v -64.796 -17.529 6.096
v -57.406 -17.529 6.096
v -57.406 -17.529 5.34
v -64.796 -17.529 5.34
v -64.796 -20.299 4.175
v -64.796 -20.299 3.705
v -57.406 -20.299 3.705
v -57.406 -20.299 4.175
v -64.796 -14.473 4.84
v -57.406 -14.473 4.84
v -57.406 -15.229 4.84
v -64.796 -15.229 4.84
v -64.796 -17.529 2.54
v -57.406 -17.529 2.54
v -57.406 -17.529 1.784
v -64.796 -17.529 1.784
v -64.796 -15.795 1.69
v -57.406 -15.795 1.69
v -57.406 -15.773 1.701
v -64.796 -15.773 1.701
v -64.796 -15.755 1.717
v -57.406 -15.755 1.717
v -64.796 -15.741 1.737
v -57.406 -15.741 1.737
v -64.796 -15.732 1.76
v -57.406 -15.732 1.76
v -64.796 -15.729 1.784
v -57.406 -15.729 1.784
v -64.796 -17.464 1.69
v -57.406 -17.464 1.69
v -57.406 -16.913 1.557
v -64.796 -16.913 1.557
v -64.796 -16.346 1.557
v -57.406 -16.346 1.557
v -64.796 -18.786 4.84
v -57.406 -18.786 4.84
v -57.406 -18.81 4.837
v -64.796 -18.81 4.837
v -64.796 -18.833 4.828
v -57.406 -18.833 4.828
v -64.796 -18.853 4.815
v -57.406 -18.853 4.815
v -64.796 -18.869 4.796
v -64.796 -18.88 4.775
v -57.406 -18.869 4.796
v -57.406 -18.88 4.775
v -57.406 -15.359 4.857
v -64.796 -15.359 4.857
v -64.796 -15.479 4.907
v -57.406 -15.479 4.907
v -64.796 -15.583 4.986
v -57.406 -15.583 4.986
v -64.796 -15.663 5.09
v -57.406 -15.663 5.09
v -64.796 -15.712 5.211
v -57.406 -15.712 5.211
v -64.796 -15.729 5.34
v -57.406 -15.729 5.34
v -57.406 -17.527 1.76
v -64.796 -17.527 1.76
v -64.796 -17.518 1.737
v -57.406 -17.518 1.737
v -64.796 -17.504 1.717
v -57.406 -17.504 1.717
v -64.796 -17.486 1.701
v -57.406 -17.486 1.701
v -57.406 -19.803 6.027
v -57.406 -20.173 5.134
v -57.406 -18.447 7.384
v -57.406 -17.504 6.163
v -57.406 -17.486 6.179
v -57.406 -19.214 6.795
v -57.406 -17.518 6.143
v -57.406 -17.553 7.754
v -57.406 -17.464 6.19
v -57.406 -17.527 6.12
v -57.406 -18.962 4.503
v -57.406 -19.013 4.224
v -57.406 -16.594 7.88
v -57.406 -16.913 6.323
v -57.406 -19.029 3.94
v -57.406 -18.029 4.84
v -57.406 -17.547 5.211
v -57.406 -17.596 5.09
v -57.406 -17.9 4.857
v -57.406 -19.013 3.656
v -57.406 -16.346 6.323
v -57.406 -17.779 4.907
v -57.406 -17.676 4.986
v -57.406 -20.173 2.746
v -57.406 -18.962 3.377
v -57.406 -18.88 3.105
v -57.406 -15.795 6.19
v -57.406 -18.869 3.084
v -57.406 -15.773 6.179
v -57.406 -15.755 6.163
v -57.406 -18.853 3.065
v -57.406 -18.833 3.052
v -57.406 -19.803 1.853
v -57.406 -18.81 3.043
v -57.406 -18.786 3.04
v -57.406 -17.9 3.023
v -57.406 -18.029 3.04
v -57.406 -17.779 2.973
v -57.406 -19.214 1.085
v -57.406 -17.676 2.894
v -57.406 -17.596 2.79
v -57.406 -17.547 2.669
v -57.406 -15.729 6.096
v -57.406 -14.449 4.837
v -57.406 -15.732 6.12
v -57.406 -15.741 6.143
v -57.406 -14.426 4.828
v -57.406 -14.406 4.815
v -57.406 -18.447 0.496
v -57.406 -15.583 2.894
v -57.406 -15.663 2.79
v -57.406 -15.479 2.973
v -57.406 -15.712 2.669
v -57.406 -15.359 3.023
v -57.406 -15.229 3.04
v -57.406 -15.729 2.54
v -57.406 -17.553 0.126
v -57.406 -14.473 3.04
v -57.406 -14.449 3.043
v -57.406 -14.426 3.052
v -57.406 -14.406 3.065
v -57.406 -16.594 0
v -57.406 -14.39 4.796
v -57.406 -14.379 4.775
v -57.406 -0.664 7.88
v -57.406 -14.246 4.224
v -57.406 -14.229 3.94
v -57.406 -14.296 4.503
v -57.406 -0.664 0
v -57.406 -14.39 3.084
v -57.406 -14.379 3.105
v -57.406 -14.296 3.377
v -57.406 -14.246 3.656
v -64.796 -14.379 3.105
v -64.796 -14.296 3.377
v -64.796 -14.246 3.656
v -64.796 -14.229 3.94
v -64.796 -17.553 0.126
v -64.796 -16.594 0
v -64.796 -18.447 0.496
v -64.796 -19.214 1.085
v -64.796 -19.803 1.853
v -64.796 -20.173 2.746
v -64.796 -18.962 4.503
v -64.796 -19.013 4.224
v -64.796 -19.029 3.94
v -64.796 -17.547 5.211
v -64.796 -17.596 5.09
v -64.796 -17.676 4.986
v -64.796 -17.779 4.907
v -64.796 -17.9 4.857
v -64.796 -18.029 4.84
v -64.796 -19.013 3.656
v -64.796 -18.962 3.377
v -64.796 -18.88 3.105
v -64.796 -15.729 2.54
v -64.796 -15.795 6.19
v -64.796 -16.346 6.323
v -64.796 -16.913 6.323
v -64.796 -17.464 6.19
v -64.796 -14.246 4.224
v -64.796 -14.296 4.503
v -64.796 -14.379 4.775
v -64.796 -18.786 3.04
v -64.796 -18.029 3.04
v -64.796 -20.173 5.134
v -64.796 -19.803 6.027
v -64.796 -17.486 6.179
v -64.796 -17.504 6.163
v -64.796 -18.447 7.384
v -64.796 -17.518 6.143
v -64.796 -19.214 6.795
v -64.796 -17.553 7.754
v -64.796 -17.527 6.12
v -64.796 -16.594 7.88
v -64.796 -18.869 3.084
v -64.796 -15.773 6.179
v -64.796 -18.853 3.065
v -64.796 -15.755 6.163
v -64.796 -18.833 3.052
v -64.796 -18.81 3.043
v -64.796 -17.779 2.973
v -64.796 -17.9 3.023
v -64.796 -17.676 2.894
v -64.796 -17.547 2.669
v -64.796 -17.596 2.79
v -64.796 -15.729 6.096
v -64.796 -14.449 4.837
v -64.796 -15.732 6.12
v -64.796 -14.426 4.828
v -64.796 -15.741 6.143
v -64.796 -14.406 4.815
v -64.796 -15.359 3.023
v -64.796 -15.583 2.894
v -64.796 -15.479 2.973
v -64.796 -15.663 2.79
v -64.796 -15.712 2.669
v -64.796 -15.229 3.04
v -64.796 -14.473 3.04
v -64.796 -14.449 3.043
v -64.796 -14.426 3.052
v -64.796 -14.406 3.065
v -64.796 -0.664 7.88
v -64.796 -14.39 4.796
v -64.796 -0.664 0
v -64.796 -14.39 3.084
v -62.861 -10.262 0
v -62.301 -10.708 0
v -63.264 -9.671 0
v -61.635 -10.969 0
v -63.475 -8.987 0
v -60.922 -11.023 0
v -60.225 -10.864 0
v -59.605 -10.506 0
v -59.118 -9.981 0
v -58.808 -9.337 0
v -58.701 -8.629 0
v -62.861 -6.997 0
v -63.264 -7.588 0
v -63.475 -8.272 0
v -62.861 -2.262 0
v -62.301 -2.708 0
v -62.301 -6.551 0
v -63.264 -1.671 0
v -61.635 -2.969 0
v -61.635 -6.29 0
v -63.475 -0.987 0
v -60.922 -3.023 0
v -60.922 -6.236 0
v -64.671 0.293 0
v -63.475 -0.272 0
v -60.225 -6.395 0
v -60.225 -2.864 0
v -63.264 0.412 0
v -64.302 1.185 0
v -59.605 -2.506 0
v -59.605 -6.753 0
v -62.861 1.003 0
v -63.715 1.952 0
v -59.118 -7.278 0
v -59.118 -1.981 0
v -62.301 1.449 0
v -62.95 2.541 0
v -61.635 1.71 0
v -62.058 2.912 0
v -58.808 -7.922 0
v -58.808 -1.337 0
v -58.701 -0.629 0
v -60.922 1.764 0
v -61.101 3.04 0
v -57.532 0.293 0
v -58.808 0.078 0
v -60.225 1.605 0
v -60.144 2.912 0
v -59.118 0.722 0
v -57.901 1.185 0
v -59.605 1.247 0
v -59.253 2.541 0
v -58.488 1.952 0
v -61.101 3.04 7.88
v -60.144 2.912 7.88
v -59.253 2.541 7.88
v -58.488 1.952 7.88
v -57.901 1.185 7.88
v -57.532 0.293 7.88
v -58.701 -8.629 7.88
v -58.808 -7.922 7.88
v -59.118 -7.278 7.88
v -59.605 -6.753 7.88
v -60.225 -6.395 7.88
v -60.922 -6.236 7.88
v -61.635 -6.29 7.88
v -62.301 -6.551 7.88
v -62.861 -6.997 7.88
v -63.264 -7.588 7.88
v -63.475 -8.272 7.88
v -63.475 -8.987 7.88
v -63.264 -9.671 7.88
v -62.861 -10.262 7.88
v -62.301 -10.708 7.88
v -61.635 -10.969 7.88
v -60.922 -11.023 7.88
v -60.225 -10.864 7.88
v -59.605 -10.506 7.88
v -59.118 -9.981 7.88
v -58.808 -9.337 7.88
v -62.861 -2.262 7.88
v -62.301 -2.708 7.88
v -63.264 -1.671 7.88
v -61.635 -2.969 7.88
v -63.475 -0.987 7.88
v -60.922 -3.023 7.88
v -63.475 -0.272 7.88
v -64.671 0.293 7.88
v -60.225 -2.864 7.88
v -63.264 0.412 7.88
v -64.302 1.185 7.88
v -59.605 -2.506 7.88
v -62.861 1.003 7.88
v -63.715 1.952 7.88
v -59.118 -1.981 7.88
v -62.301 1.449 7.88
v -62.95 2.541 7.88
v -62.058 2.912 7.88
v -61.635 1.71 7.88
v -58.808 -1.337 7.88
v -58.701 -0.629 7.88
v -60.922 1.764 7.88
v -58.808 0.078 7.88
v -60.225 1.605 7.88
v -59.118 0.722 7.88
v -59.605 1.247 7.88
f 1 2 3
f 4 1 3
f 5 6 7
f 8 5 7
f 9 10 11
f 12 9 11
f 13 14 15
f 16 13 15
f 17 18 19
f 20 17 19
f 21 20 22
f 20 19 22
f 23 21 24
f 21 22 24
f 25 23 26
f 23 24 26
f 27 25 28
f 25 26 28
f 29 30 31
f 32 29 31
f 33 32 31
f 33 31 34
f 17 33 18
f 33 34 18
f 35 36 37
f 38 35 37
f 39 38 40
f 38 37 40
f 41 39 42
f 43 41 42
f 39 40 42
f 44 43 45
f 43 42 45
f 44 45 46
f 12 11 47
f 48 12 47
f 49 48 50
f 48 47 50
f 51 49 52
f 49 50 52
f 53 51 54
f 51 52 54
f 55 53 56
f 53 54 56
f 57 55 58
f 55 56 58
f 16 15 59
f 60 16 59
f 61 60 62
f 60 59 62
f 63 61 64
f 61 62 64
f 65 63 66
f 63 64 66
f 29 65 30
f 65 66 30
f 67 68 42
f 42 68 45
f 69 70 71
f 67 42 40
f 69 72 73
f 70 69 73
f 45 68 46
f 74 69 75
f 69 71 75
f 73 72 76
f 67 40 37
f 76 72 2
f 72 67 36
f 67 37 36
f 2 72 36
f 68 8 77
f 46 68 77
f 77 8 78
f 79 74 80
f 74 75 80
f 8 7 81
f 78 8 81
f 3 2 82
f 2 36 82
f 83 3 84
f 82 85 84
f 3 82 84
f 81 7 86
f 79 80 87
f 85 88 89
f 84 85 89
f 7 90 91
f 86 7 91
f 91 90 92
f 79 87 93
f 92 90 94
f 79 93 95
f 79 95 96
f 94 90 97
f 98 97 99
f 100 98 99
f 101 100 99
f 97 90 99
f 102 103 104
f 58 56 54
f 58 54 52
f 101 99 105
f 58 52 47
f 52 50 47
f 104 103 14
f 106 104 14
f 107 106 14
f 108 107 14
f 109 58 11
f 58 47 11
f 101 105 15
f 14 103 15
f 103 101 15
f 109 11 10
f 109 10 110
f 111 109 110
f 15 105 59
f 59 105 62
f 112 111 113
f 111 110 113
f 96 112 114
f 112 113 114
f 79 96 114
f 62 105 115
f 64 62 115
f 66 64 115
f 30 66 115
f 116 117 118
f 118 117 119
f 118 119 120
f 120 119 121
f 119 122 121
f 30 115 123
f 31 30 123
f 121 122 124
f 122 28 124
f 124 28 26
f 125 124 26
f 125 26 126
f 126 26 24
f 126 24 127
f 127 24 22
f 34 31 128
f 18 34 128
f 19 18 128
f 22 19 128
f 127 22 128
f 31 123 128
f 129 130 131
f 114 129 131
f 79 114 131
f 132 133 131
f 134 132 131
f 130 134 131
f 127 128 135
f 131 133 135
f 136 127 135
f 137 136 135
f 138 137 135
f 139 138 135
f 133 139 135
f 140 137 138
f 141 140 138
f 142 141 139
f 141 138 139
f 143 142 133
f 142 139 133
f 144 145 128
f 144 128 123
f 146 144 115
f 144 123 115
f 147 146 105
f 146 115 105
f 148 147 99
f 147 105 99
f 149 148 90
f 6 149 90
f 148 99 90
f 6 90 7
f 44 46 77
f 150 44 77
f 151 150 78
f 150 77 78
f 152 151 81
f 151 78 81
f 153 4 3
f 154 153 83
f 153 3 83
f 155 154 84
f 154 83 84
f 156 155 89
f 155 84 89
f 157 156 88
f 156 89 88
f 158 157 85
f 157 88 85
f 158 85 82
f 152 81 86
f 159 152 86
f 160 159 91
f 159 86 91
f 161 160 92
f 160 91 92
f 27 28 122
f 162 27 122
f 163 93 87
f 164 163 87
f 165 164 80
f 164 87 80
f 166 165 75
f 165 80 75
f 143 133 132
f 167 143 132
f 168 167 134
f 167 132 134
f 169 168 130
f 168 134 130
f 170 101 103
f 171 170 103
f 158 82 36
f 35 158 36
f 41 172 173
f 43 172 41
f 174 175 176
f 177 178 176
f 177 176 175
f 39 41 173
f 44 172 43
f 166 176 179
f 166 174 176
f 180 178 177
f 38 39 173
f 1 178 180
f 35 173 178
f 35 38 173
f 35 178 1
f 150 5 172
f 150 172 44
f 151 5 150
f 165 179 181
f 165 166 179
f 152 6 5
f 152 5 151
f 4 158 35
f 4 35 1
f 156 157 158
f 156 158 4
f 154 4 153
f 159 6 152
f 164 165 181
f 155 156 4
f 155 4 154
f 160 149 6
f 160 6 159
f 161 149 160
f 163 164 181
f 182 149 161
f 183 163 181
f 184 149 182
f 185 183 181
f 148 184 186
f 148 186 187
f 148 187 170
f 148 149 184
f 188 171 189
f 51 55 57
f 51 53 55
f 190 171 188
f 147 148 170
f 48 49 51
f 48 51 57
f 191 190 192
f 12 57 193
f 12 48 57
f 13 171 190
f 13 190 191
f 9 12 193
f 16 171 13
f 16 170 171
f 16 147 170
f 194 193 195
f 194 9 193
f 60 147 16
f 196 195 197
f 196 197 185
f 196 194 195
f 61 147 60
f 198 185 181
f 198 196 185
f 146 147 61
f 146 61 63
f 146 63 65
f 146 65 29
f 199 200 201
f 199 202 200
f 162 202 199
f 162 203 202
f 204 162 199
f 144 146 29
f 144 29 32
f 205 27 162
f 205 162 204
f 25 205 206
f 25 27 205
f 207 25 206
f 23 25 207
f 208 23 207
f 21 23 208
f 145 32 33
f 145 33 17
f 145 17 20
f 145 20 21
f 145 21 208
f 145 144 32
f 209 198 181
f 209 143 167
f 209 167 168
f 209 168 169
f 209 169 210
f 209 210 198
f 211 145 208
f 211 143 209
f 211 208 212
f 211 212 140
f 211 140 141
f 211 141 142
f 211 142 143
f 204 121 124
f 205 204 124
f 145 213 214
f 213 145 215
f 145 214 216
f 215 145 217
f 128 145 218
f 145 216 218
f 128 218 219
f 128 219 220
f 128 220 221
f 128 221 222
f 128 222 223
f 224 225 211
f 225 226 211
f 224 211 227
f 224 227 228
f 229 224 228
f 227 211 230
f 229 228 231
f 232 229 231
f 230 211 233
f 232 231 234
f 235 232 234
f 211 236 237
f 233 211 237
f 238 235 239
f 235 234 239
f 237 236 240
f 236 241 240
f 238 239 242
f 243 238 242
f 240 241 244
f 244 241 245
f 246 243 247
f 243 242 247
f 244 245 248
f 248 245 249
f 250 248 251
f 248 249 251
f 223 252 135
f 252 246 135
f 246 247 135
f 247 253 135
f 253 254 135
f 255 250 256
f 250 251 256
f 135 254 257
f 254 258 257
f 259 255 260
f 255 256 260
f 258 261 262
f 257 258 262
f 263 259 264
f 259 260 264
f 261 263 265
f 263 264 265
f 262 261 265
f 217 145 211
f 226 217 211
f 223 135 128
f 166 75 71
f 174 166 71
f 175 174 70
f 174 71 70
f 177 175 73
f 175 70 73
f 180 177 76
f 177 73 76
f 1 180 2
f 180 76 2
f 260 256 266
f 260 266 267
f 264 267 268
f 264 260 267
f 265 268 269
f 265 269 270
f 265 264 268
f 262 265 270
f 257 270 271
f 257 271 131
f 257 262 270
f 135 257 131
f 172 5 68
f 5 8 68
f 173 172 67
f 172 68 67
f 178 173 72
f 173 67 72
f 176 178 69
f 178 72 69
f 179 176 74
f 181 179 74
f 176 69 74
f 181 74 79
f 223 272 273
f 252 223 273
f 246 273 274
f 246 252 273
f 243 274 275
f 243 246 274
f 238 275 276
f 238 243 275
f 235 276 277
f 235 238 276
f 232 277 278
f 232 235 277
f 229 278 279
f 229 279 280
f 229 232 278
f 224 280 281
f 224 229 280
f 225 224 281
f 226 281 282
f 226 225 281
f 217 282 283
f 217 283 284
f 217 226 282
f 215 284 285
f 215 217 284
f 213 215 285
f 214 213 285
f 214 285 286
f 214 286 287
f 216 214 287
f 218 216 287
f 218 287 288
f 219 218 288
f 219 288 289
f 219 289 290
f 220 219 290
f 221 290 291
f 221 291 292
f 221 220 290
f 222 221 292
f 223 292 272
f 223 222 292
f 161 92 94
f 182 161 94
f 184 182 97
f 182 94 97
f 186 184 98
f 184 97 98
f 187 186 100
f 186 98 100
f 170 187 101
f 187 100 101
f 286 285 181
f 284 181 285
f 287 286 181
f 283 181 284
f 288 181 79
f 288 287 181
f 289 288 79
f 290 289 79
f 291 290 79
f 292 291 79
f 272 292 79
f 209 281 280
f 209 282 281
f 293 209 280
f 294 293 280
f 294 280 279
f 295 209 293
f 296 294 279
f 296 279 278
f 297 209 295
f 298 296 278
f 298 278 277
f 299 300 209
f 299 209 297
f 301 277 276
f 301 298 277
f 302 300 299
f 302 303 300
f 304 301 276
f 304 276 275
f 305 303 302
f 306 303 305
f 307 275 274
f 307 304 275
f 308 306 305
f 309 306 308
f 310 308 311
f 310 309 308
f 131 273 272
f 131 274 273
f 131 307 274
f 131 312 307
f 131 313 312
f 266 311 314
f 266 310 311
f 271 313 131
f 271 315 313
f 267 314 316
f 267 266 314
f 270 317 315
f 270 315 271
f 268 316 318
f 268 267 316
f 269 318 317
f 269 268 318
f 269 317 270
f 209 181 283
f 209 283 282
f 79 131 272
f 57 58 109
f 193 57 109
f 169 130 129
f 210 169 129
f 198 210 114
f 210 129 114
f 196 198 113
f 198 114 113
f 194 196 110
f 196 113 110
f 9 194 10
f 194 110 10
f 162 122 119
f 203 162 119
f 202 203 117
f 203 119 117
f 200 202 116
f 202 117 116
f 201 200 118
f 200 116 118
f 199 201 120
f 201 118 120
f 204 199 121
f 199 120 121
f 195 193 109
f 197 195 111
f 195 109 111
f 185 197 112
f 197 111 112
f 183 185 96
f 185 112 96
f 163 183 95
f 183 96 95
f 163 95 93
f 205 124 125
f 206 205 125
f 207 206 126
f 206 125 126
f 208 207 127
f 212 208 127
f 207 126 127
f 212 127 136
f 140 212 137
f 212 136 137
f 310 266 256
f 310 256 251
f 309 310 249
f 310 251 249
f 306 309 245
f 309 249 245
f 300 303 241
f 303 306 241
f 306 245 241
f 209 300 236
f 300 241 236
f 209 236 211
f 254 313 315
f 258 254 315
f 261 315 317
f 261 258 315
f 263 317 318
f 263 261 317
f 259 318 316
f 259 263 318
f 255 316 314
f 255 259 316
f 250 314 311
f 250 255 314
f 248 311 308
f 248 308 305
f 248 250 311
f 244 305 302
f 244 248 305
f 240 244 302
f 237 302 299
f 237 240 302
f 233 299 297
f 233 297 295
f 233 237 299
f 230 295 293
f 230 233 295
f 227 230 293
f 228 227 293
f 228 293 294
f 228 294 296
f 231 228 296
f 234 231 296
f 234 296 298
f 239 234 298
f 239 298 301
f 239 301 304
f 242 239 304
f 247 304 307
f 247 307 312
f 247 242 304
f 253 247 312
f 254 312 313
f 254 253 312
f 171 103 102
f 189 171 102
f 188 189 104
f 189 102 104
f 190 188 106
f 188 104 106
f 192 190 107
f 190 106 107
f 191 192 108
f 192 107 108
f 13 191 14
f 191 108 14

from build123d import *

# Parameters (mm, degrees)
F0_W        = 7.39
F0_H        = 23.34
F0_R        = 2.4
F1_DEPTH    = 7.88
F2_T1_DEPTH = 26.405
F4_DEPTH    = 7.391
F5_R        = 3.705


# Not quite as in the source:
# - a fillet or chamfer that OpenCascade refuses, or shapes differently, is made with other operations: its cross-section is extruded or revolved along the edge and cut away or added


with BuildPart() as f1:
    # F0 (on Top) → F1 (new body)
    with BuildSketch(Plane.XY):
        with Locations((-61.1013304442, -8.6294944299)):
            Rectangle(F0_W, F0_H)
        with Locations((-61.1013304442, -8.6294944299)):
            Circle(F0_R, mode=Mode.SUBTRACT)
        with Locations((-61.1013304442, -0.6294944299)):
            Circle(F0_R, mode=Mode.SUBTRACT)
    extrude(amount=F1_DEPTH)

    # F2: fillet of radius 3.705 on 2 edges, made by hand

    # F2_s2 → F2_t1 (cut)
    with BuildSketch(Plane.XY.offset(-9.2625)):
        with BuildLine():
            ThreePointArc((-61.0913304442, 3.0405055701), (-63.7111610685, 1.9553361944), (-64.7963304442, -0.6644944299))
            Line((-64.7963304442, -0.6644944299), (-64.7963304442, 3.0405055701))
            Line((-64.7963304442, 3.0405055701), (-61.0913304442, 3.0405055701))
        make_face()
        with BuildLine():
            ThreePointArc((-61.1113304442, 3.0405055701), (-58.4914998199, 1.9553361944), (-57.4063304442, -0.6644944299))
            Line((-57.4063304442, -0.6644944299), (-57.4063304442, 3.0405055701))
            Line((-57.4063304442, 3.0405055701), (-61.1113304442, 3.0405055701))
        make_face()
    extrude(amount=F2_T1_DEPTH, mode=Mode.SUBTRACT)

    # F3 (on face) → F4 (cut, through all)
    with BuildSketch(Plane.YZ.offset(-57.4063304442)):
        with BuildLine():
            Line((-15.7294944299, 5.34), (-15.7294944299, 6.0963858653))
            ThreePointArc((-15.7294944299, 6.0963858653), (-15.747402223, 6.1534898894), (-15.7947118212, 6.1901417725))
            ThreePointArc((-15.7947118212, 6.1901417725), (-16.6294944299, 6.34), (-17.4642770386, 6.1901417725))
            ThreePointArc((-17.4642770386, 6.1901417725), (-17.5115866368, 6.1534898894), (-17.5294944299, 6.0963858653))
            Line((-17.5294944299, 6.0963858653), (-17.5294944299, 5.34))
            ThreePointArc((-17.5294944299, 5.34), (-17.6759410393, 4.9864466094), (-18.0294944299, 4.84))
            Line((-18.0294944299, 4.84), (-18.7858802952, 4.84))
            ThreePointArc((-18.7858802952, 4.84), (-18.8429843193, 4.8220922069), (-18.8796362024, 4.7747826087))
            ThreePointArc((-18.8796362024, 4.7747826087), (-18.9917328021, 4.3640635248), (-19.0294944299, 3.94))
            ThreePointArc((-19.0294944299, 3.94), (-18.9917328021, 3.5159364752), (-18.8796362024, 3.1052173913))
            ThreePointArc((-18.8796362024, 3.1052173913), (-18.8429843193, 3.0579077931), (-18.7858802952, 3.04))
            Line((-18.7858802952, 3.04), (-18.0294944299, 3.04))
            ThreePointArc((-18.0294944299, 3.04), (-17.6759410393, 2.8935533906), (-17.5294944299, 2.54))
            Line((-17.5294944299, 2.54), (-17.5294944299, 1.7836141347))
            ThreePointArc((-17.5294944299, 1.7836141347), (-17.5115866368, 1.7265101106), (-17.4642770386, 1.6898582275))
            ThreePointArc((-17.4642770386, 1.6898582275), (-16.6294944299, 1.54), (-15.7947118212, 1.6898582275))
            ThreePointArc((-15.7947118212, 1.6898582275), (-15.747402223, 1.7265101106), (-15.7294944299, 1.7836141347))
            Line((-15.7294944299, 1.7836141347), (-15.7294944299, 2.54))
            ThreePointArc((-15.7294944299, 2.54), (-15.5830478205, 2.8935533906), (-15.2294944299, 3.04))
            Line((-15.2294944299, 3.04), (-14.4731085646, 3.04))
            ThreePointArc((-14.4731085646, 3.04), (-14.4160045405, 3.0579077931), (-14.3793526574, 3.1052173913))
            ThreePointArc((-14.3793526574, 3.1052173913), (-14.2672560577, 3.5159364752), (-14.2294944299, 3.94))
            ThreePointArc((-14.2294944299, 3.94), (-14.2672560577, 4.3640635248), (-14.3793526574, 4.7747826087))
            ThreePointArc((-14.3793526574, 4.7747826087), (-14.4160045405, 4.8220922069), (-14.4731085646, 4.84))
            Line((-14.4731085646, 4.84), (-15.2294944299, 4.84))
            ThreePointArc((-15.2294944299, 4.84), (-15.5830478205, 4.9864466094), (-15.7294944299, 5.34))
        make_face()
    extrude(amount=-F4_DEPTH, mode=Mode.SUBTRACT)

    # F5
    f5_edges = [f1.edges().sort_by_distance(p)[0] for p in [
        (-61.10133, -20.299494, 7.88),
        (-61.10133, -20.299494, 0),
    ]]
    fillet(f5_edges, radius=F5_R)


solid = f1.part
